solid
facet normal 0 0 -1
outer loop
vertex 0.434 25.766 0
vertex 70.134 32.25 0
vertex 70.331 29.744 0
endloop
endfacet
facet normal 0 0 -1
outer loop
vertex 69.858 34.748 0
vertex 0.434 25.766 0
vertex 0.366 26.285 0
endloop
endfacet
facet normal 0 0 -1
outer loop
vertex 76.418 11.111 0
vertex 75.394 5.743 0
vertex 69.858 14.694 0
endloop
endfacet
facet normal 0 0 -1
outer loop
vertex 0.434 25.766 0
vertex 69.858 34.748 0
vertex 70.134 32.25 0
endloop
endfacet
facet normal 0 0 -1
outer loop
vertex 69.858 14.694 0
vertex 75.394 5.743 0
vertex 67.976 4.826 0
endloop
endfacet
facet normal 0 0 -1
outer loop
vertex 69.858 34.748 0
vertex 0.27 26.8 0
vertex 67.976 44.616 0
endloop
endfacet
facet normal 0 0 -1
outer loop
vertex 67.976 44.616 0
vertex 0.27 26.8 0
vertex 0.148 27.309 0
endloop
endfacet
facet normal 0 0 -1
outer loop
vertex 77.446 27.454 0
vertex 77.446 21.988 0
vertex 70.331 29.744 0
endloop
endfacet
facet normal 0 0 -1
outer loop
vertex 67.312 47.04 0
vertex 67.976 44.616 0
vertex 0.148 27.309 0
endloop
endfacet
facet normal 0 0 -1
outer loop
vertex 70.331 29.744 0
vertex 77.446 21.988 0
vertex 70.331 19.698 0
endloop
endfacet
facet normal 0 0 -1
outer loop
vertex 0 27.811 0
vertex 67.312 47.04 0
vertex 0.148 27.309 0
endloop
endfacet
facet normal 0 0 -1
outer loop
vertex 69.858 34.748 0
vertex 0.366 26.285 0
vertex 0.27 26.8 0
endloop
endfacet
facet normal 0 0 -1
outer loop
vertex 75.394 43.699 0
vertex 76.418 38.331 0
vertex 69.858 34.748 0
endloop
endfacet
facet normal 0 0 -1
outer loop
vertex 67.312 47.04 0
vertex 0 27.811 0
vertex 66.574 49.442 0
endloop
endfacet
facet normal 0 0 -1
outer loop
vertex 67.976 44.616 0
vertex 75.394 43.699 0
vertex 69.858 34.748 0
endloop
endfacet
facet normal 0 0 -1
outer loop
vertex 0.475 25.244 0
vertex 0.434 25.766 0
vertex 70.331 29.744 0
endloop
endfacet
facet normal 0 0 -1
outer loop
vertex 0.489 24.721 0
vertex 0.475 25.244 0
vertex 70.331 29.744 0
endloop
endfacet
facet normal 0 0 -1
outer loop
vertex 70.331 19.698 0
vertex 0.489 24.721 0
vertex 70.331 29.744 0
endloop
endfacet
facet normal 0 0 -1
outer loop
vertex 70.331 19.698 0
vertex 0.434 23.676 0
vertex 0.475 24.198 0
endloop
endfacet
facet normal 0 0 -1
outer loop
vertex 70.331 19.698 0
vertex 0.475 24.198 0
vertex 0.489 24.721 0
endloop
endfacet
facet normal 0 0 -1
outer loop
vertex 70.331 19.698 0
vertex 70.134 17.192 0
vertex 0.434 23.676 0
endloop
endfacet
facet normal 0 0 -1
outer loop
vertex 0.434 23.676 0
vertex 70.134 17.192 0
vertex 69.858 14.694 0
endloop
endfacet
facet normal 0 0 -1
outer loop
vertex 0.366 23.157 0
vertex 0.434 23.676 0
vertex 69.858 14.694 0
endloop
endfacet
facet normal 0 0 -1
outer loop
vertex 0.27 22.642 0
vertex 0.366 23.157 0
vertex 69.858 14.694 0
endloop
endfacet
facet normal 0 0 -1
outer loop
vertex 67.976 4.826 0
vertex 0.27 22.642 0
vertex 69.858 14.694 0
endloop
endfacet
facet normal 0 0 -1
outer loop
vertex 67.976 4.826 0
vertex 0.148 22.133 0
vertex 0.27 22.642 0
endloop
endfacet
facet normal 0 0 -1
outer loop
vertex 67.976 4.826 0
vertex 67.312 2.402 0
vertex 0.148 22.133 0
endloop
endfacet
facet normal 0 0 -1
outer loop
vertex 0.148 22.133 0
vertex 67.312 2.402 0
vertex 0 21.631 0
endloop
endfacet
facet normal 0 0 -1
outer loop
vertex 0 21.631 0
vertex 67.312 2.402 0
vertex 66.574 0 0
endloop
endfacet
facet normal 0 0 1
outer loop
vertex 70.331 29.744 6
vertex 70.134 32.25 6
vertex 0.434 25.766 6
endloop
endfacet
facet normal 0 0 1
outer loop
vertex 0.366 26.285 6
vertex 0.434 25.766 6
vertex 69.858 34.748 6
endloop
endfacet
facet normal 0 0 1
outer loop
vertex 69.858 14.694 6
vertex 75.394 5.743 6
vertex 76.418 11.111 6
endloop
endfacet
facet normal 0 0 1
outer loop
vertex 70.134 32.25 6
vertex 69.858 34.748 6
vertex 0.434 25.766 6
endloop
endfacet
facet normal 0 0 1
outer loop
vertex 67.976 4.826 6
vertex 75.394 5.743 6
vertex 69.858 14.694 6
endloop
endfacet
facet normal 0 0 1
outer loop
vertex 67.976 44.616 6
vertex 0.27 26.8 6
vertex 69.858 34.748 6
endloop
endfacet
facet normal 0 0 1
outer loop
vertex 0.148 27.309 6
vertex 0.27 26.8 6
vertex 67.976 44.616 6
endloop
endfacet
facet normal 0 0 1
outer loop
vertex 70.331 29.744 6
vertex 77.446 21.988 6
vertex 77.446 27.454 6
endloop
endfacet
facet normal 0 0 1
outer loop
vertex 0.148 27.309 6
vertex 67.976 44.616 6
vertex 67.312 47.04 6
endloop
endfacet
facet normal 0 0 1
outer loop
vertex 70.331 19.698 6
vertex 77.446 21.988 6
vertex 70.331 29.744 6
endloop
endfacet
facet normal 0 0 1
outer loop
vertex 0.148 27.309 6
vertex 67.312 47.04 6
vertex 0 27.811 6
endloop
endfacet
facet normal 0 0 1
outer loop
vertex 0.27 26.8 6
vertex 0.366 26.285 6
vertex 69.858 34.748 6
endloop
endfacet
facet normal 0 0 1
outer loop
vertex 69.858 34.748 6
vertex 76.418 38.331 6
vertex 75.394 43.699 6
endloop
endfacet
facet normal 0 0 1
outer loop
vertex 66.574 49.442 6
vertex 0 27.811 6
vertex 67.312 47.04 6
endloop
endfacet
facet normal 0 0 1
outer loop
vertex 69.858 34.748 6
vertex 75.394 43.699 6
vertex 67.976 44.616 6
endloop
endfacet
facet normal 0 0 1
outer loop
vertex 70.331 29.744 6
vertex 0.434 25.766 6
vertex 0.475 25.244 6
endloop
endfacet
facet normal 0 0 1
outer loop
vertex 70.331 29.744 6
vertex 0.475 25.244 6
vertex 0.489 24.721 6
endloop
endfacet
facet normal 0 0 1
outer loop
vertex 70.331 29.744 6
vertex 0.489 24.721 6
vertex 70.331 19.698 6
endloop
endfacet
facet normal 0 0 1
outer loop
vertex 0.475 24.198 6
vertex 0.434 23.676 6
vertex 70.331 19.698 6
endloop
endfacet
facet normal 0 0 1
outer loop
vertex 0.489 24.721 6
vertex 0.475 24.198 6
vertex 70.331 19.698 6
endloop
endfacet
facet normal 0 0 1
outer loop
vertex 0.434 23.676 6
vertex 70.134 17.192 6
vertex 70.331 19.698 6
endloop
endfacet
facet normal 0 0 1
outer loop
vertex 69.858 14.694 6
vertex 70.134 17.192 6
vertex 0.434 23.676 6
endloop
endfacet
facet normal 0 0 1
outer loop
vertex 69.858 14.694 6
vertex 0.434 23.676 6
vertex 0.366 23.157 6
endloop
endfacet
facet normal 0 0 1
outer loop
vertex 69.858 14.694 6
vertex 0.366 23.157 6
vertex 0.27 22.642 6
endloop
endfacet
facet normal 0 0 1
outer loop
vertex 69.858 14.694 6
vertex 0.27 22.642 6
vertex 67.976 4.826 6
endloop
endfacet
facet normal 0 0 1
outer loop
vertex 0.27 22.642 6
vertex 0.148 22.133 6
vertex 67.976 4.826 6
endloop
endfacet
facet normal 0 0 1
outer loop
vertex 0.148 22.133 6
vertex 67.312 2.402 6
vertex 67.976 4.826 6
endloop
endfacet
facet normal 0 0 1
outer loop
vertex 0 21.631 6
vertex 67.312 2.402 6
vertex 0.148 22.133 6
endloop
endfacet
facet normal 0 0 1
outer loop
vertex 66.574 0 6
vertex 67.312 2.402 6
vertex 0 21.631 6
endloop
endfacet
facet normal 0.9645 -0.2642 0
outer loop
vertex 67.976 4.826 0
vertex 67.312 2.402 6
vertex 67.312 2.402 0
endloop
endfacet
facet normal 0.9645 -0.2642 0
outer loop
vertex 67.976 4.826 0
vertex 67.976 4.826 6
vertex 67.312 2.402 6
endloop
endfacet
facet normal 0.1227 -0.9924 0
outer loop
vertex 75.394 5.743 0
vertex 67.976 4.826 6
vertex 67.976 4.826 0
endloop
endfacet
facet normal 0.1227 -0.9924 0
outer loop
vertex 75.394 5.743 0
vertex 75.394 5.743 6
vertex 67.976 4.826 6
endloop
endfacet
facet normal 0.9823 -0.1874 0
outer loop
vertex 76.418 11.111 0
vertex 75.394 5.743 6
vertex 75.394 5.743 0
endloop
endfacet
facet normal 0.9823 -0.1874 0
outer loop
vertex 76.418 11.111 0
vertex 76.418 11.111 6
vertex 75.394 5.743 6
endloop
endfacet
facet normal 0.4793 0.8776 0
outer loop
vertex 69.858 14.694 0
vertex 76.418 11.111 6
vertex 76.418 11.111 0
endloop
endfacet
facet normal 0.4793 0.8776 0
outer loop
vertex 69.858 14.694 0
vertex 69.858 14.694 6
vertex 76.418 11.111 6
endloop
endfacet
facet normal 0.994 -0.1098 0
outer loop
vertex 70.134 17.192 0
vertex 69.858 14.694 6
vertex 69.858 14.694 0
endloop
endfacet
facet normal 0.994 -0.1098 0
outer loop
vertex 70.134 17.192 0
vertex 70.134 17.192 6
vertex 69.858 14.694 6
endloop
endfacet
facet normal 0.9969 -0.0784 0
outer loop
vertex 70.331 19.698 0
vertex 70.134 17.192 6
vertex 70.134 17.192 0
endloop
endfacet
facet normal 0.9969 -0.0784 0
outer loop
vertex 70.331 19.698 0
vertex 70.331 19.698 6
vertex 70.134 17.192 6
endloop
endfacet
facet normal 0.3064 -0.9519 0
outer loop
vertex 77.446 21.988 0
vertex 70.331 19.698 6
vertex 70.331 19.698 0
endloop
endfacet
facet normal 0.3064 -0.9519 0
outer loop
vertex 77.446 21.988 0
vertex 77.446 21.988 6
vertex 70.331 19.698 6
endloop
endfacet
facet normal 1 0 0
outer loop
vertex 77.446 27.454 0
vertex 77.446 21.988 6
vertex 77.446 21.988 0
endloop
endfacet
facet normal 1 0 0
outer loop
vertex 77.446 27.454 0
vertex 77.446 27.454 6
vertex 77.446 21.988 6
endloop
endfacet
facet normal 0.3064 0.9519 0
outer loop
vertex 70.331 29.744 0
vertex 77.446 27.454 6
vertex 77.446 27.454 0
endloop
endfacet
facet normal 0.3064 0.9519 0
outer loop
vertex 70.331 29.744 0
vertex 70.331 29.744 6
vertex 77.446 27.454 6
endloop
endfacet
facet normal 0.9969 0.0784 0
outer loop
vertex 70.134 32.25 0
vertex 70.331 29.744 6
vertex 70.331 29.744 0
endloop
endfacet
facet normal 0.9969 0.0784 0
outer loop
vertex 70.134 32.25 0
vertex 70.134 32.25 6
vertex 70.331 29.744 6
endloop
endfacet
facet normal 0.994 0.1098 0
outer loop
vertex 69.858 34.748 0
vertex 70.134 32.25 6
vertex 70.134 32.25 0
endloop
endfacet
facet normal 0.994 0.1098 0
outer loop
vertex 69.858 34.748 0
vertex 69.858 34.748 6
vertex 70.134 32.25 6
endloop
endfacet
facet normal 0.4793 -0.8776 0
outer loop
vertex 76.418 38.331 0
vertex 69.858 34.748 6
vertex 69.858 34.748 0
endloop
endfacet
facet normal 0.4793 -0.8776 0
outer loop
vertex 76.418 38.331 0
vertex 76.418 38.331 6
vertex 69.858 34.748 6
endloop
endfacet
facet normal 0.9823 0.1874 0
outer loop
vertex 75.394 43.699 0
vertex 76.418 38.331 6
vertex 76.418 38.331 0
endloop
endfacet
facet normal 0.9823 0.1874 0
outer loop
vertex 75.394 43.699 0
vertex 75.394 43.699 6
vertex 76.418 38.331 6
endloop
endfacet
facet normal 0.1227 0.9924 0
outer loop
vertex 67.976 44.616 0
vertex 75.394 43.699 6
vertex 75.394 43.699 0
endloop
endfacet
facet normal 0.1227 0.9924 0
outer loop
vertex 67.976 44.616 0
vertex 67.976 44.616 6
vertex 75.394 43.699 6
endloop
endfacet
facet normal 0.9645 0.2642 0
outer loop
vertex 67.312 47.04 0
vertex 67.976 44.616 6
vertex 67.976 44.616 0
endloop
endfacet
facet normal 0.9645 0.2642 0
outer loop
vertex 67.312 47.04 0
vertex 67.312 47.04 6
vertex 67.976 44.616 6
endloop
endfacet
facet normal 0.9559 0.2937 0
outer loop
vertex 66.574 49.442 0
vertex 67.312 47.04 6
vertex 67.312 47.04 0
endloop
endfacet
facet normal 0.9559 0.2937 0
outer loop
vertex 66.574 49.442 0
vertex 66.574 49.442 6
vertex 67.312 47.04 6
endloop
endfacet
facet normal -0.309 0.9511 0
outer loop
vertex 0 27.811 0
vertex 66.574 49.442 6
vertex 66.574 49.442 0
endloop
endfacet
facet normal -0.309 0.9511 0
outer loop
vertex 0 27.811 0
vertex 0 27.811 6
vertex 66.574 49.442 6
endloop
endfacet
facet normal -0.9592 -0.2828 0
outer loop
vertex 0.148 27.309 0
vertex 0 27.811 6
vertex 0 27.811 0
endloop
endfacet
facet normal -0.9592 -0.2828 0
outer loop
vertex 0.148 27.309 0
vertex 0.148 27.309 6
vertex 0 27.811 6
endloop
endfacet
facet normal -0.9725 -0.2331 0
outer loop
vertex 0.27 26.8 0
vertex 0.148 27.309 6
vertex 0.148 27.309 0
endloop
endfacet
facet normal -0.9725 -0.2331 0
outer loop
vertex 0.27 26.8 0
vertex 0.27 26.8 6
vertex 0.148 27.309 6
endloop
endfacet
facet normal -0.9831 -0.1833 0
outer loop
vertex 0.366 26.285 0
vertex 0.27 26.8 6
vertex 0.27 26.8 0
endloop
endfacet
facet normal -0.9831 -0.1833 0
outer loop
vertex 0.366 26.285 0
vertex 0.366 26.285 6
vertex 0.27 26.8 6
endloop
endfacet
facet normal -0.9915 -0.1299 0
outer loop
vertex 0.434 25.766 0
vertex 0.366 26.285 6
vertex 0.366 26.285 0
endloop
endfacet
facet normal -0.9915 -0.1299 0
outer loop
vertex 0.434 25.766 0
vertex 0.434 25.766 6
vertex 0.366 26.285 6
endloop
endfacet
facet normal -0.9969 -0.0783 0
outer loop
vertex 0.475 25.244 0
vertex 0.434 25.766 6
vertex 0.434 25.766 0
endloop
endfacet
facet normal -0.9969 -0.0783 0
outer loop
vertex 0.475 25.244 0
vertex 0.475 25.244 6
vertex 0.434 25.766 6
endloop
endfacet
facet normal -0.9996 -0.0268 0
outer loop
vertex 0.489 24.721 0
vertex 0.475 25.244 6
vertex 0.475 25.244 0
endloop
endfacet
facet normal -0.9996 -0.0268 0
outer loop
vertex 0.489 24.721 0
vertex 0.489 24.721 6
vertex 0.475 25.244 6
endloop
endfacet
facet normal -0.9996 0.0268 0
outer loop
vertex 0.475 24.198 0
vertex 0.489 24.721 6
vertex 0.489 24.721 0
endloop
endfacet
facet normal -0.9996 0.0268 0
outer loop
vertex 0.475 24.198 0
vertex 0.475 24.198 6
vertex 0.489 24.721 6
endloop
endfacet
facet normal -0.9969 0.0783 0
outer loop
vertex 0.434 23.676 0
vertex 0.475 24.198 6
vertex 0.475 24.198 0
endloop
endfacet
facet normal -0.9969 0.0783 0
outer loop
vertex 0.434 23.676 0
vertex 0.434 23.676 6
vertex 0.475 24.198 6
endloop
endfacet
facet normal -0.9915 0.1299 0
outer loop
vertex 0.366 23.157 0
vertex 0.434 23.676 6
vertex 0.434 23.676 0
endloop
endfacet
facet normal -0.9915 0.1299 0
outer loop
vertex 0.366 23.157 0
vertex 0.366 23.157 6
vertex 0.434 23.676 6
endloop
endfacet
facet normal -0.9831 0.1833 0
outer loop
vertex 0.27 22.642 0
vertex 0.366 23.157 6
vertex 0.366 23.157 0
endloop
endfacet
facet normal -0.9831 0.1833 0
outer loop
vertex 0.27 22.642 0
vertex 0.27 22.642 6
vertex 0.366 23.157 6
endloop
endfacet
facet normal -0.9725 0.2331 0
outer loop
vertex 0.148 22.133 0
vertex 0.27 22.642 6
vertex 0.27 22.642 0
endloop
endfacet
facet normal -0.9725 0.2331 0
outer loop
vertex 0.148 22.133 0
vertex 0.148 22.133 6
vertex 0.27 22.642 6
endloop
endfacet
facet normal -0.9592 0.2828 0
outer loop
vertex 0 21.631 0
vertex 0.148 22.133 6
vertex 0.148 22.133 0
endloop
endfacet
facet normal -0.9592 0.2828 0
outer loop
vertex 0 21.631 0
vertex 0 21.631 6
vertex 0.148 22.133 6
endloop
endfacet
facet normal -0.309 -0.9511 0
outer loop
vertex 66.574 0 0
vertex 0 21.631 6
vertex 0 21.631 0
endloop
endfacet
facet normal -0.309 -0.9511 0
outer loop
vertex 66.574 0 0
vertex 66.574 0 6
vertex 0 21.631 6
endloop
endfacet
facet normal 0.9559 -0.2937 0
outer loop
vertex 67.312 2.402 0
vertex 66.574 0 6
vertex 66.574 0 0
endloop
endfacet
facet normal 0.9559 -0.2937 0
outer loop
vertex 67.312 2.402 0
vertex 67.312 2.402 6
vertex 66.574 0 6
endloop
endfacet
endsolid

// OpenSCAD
$fn = 32;

// ----------------------------------------------------------------------
// Gear sector: 3 teeth on 36 degrees
// ----------------------------------------------------------------------

// --- parameters (mm) ---
sector_angle = 36;        // sector angle, degrees
root_r = 80;              // root circle radius
tooth_h = 7;              // tooth height over the root circle
teeth = 3;                // number of teeth on the sector
hub_r = 10;               // hub bore radius
plate_t = 6;              // sector thickness, Z
arc_step = 3;             // sampling step of the root/hub arcs, degrees

tip_r = root_r + tooth_h;  // tip circle radius

profile = [[66.574, 0], [67.312, 2.402], [67.976, 4.826], [75.394, 5.743], [76.418, 11.111], [69.858, 14.694], [70.134, 17.192], [70.331, 19.698], [77.446, 21.988], [77.446, 27.454], [70.331, 29.744], [70.134, 32.25], [69.858, 34.748], [76.418, 38.331], [75.394, 43.699], [67.976, 44.616], [67.312, 47.04], [66.574, 49.442], [0, 27.811], [0.148, 27.309], [0.27, 26.8], [0.366, 26.285], [0.434, 25.766], [0.475, 25.244], [0.489, 24.721], [0.475, 24.198], [0.434, 23.676], [0.366, 23.157], [0.27, 22.642], [0.148, 22.133], [0, 21.631]];  // primary outline, 31 points, counter clockwise

// --- the one profile operation ---
linear_extrude(height = plate_t) polygon(points = profile);
